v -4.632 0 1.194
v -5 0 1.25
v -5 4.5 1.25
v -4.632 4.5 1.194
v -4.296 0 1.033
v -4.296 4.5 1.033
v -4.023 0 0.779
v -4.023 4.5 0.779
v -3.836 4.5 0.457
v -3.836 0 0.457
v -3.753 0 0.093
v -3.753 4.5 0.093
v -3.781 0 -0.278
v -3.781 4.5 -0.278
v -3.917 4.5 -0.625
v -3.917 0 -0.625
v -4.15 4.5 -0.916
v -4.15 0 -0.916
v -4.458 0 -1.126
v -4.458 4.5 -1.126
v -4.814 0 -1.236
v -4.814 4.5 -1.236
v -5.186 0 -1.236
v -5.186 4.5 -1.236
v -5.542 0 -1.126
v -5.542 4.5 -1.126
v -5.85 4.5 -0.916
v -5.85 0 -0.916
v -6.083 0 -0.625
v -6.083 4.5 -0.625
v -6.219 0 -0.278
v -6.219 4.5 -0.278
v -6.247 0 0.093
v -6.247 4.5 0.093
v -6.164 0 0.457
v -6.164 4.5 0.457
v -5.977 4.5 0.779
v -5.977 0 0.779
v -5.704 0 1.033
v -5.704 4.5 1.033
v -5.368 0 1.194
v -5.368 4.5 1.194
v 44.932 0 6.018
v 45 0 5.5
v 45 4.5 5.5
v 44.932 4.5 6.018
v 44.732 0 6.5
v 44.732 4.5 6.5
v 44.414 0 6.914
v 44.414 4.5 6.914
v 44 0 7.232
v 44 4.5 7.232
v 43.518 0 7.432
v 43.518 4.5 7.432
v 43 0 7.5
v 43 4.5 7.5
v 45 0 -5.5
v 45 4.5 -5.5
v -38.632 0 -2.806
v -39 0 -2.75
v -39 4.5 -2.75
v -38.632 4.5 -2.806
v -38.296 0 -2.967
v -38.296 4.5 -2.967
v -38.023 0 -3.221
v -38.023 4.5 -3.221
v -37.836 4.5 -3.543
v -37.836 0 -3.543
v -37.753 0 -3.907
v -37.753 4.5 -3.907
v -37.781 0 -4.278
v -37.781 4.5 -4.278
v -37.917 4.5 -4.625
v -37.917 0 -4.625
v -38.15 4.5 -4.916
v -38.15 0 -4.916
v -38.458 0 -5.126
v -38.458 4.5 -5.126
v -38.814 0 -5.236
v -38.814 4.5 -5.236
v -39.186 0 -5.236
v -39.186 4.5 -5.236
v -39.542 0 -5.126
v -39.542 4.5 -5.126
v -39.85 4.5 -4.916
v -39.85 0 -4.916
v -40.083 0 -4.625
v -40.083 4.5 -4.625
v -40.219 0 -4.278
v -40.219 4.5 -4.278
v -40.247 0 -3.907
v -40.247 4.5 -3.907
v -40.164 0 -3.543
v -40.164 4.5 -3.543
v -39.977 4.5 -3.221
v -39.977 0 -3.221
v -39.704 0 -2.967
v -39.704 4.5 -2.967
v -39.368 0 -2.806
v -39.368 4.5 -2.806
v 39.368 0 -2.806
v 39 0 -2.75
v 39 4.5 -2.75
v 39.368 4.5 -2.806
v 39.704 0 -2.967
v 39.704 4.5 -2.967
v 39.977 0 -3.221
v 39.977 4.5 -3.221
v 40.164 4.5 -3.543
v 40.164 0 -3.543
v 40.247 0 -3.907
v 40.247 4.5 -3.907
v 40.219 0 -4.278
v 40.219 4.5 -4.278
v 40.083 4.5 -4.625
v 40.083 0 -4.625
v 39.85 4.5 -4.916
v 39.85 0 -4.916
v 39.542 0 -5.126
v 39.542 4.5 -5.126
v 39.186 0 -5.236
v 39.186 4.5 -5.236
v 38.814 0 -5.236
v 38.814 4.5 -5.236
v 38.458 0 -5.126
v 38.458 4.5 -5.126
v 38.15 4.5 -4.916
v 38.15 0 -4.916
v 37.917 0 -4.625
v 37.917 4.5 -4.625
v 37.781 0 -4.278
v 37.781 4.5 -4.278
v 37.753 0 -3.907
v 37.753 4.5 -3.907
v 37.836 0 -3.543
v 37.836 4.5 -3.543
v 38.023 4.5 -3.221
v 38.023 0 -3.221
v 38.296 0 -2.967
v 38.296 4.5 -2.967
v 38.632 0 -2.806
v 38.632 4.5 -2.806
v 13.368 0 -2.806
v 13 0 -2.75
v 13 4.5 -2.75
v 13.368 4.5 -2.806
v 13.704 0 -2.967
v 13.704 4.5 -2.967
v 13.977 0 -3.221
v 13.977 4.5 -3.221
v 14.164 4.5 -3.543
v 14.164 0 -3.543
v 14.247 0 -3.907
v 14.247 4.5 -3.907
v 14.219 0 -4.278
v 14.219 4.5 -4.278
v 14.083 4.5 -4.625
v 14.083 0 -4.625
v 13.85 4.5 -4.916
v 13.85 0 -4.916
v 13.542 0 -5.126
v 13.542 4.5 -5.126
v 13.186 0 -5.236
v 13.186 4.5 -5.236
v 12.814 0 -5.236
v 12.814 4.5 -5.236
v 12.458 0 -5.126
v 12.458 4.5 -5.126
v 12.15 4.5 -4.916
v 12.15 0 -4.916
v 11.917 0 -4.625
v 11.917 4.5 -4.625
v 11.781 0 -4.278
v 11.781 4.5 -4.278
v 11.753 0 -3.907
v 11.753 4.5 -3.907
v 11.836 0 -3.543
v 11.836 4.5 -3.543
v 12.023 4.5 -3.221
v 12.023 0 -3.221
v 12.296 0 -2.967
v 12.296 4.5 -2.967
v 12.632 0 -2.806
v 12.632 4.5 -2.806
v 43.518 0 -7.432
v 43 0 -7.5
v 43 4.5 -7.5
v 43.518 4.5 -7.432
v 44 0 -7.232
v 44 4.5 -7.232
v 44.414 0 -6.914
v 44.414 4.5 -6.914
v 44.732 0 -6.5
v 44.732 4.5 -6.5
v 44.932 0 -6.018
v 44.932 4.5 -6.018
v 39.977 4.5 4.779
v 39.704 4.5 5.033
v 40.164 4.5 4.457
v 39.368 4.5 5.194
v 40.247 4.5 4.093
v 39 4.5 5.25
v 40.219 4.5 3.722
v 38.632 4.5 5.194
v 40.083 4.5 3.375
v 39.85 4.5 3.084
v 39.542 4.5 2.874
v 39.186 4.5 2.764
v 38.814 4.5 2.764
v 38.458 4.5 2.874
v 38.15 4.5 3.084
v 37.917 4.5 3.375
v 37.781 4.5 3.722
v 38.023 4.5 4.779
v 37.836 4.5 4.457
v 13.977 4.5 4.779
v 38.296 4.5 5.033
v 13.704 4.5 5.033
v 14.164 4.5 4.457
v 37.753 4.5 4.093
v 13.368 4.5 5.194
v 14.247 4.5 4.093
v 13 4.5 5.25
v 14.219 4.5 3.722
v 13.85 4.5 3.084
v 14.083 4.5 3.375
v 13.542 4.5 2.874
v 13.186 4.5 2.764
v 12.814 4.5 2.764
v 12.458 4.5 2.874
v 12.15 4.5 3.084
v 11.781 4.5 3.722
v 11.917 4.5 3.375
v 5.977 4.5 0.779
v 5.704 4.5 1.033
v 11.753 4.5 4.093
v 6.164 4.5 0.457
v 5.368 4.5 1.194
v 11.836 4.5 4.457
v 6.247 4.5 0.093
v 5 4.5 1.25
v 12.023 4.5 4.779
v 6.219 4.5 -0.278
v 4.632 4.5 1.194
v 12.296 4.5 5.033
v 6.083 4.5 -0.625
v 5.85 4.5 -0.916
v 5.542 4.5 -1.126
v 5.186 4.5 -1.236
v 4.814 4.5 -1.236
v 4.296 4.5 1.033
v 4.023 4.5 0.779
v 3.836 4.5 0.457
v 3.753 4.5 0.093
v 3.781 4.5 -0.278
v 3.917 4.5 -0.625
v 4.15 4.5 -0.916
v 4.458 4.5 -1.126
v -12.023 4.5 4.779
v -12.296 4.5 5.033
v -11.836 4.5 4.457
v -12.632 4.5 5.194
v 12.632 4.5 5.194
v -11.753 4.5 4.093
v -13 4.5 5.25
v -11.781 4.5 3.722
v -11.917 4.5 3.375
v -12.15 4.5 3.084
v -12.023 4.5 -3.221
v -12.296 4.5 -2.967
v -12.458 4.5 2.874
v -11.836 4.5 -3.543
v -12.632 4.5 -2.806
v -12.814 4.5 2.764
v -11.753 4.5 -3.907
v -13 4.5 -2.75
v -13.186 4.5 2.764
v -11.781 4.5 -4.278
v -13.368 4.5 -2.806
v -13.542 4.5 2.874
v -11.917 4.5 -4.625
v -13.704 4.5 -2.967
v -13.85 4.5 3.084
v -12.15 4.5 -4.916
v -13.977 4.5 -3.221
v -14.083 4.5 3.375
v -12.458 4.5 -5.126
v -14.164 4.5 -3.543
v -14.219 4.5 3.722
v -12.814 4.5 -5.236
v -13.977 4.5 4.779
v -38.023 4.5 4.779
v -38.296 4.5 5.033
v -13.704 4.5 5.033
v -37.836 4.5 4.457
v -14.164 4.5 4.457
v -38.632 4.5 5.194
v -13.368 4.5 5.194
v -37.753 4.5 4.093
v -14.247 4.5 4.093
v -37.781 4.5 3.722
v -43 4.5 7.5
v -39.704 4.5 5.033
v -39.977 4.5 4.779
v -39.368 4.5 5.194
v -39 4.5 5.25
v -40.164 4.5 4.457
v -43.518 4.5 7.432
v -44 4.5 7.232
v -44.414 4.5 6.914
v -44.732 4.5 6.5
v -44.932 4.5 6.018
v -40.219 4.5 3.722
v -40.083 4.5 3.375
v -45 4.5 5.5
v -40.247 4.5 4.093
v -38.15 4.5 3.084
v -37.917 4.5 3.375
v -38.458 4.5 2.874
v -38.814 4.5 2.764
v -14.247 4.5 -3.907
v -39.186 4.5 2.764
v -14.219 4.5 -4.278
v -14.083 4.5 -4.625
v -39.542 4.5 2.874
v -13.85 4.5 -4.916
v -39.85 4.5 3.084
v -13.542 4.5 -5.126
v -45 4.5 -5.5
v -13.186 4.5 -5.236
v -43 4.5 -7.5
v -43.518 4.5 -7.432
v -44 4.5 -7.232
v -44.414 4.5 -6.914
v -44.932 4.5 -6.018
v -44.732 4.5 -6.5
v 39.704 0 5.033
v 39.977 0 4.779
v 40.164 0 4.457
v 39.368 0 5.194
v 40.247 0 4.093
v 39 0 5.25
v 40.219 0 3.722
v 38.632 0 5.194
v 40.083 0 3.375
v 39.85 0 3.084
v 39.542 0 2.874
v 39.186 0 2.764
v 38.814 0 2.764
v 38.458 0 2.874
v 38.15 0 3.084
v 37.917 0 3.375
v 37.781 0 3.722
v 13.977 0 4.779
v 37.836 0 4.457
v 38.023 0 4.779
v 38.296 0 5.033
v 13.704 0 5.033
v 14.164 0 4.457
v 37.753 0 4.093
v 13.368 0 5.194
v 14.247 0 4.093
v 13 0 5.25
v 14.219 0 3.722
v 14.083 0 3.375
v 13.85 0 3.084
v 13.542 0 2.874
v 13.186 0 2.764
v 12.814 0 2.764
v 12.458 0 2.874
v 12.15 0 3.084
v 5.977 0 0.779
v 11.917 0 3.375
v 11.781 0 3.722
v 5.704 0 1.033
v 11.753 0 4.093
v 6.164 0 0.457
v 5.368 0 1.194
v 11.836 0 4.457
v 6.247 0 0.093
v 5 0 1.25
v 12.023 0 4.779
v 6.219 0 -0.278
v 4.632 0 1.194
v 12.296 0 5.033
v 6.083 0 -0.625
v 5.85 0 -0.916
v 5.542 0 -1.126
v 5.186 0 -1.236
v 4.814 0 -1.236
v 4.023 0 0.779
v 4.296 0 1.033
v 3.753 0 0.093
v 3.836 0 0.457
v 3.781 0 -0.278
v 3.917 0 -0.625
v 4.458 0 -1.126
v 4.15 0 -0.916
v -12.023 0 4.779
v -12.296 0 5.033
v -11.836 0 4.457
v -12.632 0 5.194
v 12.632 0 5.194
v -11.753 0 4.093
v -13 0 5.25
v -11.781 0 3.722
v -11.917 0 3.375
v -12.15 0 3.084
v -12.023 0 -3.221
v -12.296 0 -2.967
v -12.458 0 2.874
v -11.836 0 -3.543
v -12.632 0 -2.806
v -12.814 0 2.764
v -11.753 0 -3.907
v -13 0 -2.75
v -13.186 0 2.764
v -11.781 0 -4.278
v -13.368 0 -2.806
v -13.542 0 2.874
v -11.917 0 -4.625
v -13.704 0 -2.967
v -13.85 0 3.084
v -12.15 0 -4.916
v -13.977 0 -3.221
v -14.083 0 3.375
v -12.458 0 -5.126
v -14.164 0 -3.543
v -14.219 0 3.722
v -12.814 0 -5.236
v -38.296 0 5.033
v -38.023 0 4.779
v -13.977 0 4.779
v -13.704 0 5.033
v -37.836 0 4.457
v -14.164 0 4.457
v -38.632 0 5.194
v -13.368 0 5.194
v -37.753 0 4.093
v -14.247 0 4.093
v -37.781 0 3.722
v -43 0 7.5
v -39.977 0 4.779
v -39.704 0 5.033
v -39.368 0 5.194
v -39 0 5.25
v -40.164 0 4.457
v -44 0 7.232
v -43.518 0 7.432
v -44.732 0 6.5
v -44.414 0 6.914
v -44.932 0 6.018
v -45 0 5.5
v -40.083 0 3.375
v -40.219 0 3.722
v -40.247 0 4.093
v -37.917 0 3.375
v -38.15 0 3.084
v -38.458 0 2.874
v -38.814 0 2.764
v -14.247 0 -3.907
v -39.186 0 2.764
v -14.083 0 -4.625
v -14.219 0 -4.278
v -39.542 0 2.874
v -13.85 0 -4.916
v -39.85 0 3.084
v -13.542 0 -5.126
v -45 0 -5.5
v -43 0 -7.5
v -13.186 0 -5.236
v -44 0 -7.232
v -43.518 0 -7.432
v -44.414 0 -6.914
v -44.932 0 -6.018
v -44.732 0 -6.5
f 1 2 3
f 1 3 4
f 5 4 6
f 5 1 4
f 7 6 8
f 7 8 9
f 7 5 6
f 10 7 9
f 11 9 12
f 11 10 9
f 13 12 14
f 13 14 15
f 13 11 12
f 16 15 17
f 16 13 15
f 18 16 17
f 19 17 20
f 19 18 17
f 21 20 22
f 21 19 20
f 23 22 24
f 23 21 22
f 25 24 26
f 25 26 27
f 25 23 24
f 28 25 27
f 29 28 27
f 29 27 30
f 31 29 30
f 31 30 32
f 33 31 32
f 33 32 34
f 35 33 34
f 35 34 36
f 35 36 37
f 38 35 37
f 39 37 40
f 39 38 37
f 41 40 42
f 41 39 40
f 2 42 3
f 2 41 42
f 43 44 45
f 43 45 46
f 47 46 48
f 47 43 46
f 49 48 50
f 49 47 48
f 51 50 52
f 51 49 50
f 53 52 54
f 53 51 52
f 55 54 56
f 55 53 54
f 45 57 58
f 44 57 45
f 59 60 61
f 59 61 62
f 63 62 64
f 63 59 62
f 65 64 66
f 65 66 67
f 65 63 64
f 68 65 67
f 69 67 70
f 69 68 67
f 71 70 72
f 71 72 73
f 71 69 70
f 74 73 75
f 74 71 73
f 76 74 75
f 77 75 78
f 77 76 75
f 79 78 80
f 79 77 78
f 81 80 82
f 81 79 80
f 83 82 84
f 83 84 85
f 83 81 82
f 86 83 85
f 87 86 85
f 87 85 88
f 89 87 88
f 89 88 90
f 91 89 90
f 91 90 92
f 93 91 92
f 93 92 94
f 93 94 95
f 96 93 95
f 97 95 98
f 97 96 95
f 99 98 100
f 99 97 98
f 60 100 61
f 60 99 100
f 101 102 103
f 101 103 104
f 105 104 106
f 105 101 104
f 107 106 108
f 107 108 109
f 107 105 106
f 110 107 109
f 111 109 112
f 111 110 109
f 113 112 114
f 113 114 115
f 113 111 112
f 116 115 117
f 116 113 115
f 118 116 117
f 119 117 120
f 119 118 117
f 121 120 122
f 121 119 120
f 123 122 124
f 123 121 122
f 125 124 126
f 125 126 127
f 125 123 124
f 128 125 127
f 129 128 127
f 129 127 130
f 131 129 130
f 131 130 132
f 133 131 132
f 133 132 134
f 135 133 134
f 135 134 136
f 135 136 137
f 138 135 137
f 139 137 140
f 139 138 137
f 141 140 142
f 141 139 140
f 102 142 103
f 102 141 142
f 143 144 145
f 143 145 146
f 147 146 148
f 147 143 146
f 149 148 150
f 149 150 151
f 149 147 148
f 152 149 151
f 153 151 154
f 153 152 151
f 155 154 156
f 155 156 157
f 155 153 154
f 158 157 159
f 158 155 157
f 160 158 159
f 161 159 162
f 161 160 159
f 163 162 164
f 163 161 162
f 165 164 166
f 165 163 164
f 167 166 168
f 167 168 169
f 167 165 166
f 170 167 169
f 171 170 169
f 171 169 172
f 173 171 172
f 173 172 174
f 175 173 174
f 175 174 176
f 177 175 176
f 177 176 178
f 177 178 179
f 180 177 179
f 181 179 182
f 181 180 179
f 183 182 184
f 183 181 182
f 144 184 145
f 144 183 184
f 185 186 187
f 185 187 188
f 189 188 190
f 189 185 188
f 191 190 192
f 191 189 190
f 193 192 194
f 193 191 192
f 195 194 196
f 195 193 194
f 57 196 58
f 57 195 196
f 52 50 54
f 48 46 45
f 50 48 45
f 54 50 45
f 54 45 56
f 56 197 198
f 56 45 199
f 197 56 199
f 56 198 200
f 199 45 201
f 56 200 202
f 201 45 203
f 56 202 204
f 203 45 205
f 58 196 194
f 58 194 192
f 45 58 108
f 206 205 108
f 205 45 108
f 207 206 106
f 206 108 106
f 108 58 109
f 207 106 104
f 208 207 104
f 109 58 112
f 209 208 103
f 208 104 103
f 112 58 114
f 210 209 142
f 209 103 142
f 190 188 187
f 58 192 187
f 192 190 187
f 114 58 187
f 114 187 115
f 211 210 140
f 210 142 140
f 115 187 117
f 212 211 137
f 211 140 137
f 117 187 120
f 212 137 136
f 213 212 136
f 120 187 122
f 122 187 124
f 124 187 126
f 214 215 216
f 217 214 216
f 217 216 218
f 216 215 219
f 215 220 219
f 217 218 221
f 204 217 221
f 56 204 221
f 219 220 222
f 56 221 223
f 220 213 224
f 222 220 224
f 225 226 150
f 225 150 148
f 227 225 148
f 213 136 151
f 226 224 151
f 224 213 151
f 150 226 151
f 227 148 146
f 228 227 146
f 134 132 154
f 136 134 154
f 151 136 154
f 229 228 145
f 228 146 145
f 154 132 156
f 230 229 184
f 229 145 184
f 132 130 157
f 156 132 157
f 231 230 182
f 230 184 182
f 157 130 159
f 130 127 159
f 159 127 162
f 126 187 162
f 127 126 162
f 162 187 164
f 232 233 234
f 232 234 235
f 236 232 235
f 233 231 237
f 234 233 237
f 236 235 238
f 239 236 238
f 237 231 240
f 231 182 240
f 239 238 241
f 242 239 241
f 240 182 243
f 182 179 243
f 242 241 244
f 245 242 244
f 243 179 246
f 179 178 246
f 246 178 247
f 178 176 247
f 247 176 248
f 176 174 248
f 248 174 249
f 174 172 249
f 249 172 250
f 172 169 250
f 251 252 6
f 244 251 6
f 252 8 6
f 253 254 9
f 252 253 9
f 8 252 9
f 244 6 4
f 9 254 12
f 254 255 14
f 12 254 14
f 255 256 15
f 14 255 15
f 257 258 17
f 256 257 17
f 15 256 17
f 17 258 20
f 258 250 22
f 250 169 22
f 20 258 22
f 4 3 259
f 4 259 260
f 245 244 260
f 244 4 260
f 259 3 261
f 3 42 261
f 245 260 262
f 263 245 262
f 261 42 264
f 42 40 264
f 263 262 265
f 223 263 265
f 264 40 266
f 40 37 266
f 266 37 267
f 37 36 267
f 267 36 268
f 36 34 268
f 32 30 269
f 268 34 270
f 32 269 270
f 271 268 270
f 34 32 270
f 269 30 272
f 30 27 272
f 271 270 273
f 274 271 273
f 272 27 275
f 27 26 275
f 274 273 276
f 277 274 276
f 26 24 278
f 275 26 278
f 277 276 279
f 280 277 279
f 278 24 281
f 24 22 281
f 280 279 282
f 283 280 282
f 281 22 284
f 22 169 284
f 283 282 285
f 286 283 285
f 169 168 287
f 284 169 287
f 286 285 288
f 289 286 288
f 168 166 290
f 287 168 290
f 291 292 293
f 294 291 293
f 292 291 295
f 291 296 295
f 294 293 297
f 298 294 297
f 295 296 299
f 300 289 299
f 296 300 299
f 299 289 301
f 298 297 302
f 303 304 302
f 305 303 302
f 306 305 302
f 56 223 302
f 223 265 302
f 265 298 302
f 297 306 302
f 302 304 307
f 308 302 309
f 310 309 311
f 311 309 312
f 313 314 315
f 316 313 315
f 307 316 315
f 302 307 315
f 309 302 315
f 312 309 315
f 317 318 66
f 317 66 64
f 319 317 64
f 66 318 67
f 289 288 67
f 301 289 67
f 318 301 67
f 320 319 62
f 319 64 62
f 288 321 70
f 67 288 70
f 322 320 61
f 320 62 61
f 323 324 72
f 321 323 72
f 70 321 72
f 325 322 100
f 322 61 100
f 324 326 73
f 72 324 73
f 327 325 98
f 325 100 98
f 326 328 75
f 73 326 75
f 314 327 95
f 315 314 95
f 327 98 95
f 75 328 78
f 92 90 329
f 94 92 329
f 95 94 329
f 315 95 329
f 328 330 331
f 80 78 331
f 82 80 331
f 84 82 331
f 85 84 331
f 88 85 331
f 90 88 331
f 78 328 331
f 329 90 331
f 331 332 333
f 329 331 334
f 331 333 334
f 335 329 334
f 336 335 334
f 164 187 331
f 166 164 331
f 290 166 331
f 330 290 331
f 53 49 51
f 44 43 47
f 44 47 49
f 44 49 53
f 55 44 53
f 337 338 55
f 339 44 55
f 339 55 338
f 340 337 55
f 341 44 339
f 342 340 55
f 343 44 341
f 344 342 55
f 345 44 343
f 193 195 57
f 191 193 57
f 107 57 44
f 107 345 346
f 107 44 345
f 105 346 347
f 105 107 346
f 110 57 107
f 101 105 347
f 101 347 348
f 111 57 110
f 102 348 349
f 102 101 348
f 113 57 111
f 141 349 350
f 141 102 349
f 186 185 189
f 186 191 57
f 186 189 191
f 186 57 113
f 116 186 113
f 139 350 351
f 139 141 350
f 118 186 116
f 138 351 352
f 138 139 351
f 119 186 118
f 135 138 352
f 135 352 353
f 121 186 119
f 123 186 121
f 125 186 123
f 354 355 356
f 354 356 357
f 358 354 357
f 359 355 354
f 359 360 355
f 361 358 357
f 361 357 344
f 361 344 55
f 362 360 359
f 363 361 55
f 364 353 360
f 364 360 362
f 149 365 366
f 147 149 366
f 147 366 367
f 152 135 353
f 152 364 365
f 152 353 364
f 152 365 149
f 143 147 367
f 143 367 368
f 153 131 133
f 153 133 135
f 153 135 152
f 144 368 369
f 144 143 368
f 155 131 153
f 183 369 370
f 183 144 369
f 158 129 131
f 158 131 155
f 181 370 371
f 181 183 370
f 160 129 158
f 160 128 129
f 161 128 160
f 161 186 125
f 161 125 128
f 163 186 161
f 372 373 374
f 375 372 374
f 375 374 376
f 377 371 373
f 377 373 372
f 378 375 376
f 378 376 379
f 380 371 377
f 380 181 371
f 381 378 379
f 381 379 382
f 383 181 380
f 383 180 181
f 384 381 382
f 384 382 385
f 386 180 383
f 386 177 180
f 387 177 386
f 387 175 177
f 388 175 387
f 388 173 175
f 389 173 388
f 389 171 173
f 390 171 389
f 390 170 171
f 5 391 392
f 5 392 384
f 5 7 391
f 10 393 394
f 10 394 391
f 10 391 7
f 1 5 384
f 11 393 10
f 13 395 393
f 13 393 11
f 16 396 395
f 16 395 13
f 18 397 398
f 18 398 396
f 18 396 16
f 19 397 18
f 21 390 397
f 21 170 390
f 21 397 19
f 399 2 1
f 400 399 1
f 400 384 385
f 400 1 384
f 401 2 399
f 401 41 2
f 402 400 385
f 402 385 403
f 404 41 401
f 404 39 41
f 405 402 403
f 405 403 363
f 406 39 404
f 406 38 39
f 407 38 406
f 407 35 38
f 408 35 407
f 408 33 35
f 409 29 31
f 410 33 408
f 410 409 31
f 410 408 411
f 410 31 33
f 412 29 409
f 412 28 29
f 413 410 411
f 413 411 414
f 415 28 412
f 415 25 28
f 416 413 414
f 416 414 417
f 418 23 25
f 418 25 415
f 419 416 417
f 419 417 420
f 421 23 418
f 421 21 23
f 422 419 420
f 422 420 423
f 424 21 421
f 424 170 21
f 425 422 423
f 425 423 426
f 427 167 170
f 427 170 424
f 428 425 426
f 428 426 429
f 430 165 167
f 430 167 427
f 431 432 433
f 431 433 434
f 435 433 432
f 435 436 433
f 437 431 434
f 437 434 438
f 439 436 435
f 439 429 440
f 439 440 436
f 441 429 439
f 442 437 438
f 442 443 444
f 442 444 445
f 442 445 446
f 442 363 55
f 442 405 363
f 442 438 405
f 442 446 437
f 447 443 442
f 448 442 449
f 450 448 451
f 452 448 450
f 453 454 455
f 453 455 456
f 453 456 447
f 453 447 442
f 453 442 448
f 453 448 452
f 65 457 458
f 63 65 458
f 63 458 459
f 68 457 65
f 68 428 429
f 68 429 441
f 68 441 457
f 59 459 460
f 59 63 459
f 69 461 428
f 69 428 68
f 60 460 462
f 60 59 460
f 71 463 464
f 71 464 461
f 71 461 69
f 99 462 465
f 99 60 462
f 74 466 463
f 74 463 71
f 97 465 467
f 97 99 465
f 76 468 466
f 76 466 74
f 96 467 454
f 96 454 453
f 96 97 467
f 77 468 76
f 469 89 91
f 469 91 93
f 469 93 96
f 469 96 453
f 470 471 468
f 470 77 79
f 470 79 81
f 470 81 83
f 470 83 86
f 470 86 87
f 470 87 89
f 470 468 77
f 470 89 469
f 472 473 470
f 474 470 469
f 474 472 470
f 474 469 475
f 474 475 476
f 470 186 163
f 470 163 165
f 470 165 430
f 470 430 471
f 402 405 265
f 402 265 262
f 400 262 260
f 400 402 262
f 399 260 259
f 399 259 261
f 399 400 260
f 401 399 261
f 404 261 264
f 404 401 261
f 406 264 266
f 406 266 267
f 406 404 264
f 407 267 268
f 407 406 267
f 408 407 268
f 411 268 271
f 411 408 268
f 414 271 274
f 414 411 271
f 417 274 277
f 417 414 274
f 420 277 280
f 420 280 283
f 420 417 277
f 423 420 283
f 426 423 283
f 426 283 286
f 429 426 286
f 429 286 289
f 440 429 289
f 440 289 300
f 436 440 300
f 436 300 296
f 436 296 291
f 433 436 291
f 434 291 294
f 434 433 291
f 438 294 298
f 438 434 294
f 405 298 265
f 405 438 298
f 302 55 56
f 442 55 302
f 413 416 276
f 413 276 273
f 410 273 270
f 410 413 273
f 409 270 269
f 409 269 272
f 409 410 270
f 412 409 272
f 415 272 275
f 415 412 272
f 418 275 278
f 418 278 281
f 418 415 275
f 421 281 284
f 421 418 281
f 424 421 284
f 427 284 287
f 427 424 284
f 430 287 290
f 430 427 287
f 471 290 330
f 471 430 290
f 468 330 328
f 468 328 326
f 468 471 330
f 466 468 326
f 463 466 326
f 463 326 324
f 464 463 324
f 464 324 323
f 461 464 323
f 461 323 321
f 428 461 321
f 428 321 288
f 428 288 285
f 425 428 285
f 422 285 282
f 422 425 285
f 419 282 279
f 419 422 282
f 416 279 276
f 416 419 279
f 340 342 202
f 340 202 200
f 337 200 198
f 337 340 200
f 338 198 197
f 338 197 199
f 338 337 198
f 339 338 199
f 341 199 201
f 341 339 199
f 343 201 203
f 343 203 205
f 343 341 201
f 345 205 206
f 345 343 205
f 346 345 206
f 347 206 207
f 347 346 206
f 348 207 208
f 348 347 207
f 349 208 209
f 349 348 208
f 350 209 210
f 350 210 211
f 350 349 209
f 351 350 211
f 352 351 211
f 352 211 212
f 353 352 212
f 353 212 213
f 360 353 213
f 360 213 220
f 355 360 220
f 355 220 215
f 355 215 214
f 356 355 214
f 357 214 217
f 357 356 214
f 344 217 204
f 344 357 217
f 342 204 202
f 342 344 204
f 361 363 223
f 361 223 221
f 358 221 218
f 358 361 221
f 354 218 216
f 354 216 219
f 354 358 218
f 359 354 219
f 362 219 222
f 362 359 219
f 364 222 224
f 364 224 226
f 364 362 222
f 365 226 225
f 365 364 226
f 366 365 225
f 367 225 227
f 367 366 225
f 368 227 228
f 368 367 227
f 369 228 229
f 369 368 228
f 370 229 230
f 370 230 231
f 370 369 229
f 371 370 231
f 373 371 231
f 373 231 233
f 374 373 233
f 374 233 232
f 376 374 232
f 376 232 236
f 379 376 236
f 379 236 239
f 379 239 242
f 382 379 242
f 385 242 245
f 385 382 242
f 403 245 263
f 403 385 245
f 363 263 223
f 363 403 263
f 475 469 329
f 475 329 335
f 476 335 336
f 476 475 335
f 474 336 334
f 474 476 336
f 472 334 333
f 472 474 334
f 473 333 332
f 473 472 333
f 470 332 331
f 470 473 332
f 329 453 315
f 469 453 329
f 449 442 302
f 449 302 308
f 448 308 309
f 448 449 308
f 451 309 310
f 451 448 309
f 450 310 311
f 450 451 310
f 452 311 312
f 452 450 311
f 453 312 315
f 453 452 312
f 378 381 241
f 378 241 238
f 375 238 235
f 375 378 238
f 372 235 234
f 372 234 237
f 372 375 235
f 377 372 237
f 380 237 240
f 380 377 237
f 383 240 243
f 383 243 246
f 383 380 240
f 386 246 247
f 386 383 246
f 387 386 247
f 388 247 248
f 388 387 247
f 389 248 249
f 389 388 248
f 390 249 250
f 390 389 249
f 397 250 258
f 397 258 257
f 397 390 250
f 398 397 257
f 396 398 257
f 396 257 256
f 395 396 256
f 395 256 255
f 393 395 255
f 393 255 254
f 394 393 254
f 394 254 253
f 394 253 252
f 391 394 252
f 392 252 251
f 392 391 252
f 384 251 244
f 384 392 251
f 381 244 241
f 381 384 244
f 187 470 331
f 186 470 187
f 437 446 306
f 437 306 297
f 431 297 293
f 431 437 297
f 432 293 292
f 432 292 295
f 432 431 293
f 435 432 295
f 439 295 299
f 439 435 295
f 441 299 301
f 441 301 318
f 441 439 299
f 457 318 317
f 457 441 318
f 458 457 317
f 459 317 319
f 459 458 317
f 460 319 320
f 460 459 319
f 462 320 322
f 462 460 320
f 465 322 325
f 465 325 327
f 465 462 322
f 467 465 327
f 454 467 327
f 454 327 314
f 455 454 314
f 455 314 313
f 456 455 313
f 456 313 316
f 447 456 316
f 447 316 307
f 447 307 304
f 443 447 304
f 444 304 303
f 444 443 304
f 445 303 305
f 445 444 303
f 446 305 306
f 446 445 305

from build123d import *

# Parameters (mm, degrees)
SKETCH_1_R      = 1.25
EXTRUDE_1_DEPTH = 4.5


with BuildPart() as part:
    # 草图1 → 凸台-拉伸1 (new body)
    with BuildSketch(Plane(origin=(0, 0, 0), x_dir=(1, 0, 0), z_dir=(0, 1, 0))):
        with BuildLine():
            Line((-43, 7.5), (43, 7.5))
            ThreePointArc((43, 7.5), (44.414213562, 6.914213562), (45, 5.5))
            Line((45, 5.5), (45, -5.5))
            ThreePointArc((45, -5.5), (44.414213562, -6.914213562), (43, -7.5))
            Line((43, -7.5), (-43, -7.5))
            ThreePointArc((-43, -7.5), (-44.414213562, -6.914213562), (-45, -5.5))
            Line((-45, -5.5), (-45, 5.5))
            ThreePointArc((-45, 5.5), (-44.414213562, 6.914213562), (-43, 7.5))
        make_face()
        with Locations(Location((-5, 0, 0), (0, 0, 270))):
            Circle(SKETCH_1_R, mode=Mode.SUBTRACT)
        with Locations(Location((5, 0, 0), (0, 0, 270))):
            Circle(SKETCH_1_R, mode=Mode.SUBTRACT)
        with Locations(Location((-39, 4, 0), (0, 0, 270))):
            Circle(SKETCH_1_R, mode=Mode.SUBTRACT)
        with Locations(Location((-39, -4, 0), (0, 0, 270))):
            Circle(SKETCH_1_R, mode=Mode.SUBTRACT)
        with Locations(Location((-13, -4, 0), (0, 0, 270))):
            Circle(SKETCH_1_R, mode=Mode.SUBTRACT)
        with Locations(Location((-13, 4, 0), (0, 0, 270))):
            Circle(SKETCH_1_R, mode=Mode.SUBTRACT)
        with Locations(Location((13, -4, 0), (0, 0, 270))):
            Circle(SKETCH_1_R, mode=Mode.SUBTRACT)
        with Locations(Location((13, 4, 0), (0, 0, 270))):
            Circle(SKETCH_1_R, mode=Mode.SUBTRACT)
        with Locations(Location((39, -4, 0), (0, 0, 270))):
            Circle(SKETCH_1_R, mode=Mode.SUBTRACT)
        with Locations(Location((39, 4, 0), (0, 0, 270))):
            Circle(SKETCH_1_R, mode=Mode.SUBTRACT)
    extrude(amount=EXTRUDE_1_DEPTH)


solid = part.part
